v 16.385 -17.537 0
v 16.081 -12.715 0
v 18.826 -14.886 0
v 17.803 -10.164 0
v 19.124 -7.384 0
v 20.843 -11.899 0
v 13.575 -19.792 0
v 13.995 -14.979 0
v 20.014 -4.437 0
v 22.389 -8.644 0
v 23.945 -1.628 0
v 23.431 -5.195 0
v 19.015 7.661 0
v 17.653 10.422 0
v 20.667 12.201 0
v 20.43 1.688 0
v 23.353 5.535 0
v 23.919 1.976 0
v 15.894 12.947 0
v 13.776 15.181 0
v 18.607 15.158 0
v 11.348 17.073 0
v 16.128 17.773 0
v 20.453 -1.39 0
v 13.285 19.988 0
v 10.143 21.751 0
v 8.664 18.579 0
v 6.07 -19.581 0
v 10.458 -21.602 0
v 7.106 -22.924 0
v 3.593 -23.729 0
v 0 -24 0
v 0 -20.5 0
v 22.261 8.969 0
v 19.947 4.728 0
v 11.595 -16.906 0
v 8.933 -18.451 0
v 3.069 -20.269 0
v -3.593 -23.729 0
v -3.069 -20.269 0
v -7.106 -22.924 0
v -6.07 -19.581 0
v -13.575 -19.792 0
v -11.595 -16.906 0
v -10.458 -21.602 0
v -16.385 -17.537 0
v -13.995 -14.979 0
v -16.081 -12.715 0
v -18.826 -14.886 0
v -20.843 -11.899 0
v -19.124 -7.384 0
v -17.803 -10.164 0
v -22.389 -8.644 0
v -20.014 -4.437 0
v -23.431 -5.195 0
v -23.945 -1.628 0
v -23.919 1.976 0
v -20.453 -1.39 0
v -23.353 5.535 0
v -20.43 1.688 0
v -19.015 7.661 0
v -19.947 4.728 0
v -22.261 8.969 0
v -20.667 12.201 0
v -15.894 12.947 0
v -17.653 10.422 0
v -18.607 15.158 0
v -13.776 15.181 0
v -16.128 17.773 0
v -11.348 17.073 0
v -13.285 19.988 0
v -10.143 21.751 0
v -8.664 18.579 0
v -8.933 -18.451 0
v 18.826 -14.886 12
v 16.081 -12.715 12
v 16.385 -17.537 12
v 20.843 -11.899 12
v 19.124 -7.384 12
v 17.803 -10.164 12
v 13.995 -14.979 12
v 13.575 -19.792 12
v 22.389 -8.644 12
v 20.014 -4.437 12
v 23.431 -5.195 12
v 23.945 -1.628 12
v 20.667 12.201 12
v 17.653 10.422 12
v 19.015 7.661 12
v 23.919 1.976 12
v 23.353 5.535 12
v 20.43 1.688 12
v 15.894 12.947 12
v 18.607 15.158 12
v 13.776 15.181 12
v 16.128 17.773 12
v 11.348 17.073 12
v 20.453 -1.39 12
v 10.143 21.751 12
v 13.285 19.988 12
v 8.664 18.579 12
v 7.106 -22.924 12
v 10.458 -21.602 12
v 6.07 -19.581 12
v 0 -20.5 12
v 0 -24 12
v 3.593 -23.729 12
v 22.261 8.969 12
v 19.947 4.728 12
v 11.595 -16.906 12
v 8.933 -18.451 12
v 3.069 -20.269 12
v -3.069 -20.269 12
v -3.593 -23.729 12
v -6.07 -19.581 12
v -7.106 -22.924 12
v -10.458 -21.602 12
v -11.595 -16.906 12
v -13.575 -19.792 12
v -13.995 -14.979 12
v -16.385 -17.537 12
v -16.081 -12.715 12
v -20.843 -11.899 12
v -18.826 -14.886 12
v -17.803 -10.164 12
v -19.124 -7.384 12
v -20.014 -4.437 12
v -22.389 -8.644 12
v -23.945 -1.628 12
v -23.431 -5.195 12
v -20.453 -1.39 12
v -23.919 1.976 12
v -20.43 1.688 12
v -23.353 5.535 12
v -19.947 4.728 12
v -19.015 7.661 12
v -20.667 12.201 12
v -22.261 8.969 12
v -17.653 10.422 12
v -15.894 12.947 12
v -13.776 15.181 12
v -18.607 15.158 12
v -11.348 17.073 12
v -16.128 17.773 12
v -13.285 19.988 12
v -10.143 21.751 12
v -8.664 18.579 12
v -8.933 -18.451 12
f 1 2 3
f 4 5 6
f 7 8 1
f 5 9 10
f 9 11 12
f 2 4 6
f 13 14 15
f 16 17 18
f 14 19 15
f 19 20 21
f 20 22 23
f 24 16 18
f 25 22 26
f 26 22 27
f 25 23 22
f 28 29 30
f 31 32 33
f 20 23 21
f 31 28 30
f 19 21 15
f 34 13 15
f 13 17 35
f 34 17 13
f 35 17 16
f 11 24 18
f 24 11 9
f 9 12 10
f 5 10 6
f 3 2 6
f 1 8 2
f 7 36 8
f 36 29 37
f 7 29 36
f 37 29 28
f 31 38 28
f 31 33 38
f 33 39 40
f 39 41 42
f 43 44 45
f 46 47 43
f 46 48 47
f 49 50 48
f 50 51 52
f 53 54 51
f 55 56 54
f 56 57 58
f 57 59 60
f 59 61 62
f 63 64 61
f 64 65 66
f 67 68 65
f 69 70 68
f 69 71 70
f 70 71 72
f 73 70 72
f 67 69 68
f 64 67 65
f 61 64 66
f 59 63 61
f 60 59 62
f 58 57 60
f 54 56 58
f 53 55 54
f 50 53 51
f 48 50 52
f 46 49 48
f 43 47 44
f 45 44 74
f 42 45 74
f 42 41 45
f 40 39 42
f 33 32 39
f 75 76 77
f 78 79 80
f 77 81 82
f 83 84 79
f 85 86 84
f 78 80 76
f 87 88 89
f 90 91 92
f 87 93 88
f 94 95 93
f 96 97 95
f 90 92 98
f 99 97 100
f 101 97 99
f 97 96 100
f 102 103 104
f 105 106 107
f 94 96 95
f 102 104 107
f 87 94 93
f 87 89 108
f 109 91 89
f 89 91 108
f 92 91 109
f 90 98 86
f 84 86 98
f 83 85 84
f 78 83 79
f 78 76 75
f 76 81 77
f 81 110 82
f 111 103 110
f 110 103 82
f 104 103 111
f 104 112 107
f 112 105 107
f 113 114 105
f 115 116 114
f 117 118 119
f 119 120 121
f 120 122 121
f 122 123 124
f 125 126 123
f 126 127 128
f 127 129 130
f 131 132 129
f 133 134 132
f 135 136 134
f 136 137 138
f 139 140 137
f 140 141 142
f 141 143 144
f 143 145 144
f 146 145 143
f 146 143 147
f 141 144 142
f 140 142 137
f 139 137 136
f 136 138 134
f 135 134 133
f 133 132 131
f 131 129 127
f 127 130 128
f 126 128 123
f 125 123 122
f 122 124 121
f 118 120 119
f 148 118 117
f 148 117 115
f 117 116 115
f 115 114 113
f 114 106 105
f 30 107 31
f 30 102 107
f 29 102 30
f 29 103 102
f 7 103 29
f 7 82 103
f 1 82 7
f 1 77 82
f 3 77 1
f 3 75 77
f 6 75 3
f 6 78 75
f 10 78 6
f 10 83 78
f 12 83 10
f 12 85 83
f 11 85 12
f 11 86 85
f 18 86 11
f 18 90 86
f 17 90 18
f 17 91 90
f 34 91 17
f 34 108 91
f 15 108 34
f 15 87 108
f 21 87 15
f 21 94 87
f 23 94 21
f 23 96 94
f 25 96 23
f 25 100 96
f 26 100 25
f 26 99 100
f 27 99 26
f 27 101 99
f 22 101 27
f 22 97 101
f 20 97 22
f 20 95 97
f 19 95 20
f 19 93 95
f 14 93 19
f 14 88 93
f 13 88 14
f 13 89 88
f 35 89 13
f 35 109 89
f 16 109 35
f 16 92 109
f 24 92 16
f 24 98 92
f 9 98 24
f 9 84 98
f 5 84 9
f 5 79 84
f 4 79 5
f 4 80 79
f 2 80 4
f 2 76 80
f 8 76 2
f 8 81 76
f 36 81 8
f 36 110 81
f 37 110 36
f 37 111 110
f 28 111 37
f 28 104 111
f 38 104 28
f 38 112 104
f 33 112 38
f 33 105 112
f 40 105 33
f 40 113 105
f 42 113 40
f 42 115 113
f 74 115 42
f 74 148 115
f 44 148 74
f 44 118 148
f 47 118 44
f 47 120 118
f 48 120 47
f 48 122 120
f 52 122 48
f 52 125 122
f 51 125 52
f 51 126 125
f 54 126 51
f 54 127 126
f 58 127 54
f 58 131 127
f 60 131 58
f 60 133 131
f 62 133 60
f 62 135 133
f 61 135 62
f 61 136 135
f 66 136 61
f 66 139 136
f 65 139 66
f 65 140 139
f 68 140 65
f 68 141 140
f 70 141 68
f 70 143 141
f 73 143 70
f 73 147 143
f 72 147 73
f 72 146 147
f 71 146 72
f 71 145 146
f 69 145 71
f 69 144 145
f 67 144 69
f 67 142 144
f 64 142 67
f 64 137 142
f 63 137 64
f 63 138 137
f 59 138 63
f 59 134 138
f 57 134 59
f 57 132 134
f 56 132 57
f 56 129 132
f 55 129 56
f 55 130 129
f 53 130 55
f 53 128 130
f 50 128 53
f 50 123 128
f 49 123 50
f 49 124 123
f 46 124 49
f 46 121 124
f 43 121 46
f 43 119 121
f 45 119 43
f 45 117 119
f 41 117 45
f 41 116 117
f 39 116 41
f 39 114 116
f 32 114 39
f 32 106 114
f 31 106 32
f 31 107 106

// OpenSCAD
$fn = 32;

// ----------------------------------------------------------------------
// Spring clip: 48 mm outside, 3.5 mm band, 50 degree opening
// ----------------------------------------------------------------------

// --- parameters (mm) ---
outer_r = 24;             // clip outside radius
inner_r = 20.5;           // clip bore radius
band = 3.5;               // band thickness
clip_w = 12;              // clip width
opening = 50;             // opening angle

clip_profile = [[-10.143, 21.751], [-13.285, 19.988], [-16.128, 17.773], [-18.607, 15.158], [-20.667, 12.201], [-22.261, 8.969], [-23.353, 5.535], [-23.919, 1.976], [-23.945, -1.628], [-23.431, -5.195], [-22.389, -8.644], [-20.843, -11.899], [-18.826, -14.886], [-16.385, -17.537], [-13.575, -19.792], [-10.458, -21.602], [-7.106, -22.924], [-3.593, -23.729], [0, -24], [3.593, -23.729], [7.106, -22.924], [10.458, -21.602], [13.575, -19.792], [16.385, -17.537], [18.826, -14.886], [20.843, -11.899], [22.389, -8.644], [23.431, -5.195], [23.945, -1.628], [23.919, 1.976], [23.353, 5.535], [22.261, 8.969], [20.667, 12.201], [18.607, 15.158], [16.128, 17.773], [13.285, 19.988], [10.143, 21.751], [8.664, 18.579], [11.348, 17.073], [13.776, 15.181], [15.894, 12.947], [17.653, 10.422], [19.015, 7.661], [19.947, 4.728], [20.43, 1.688], [20.453, -1.39], [20.014, -4.437], [19.124, -7.384], [17.803, -10.164], [16.081, -12.715], [13.995, -14.979], [11.595, -16.906], [8.933, -18.451], [6.07, -19.581], [3.069, -20.269], [0, -20.5], [-3.069, -20.269], [-6.07, -19.581], [-8.933, -18.451], [-11.595, -16.906], [-13.995, -14.979], [-16.081, -12.715], [-17.803, -10.164], [-19.124, -7.384], [-20.014, -4.437], [-20.453, -1.39], [-20.43, 1.688], [-19.947, 4.728], [-19.015, 7.661], [-17.653, 10.422], [-15.894, 12.947], [-13.776, 15.181], [-11.348, 17.073], [-8.664, 18.579]];

difference() {
  union() {
    linear_extrude(height = clip_w) polygon(clip_profile);
  }
}
